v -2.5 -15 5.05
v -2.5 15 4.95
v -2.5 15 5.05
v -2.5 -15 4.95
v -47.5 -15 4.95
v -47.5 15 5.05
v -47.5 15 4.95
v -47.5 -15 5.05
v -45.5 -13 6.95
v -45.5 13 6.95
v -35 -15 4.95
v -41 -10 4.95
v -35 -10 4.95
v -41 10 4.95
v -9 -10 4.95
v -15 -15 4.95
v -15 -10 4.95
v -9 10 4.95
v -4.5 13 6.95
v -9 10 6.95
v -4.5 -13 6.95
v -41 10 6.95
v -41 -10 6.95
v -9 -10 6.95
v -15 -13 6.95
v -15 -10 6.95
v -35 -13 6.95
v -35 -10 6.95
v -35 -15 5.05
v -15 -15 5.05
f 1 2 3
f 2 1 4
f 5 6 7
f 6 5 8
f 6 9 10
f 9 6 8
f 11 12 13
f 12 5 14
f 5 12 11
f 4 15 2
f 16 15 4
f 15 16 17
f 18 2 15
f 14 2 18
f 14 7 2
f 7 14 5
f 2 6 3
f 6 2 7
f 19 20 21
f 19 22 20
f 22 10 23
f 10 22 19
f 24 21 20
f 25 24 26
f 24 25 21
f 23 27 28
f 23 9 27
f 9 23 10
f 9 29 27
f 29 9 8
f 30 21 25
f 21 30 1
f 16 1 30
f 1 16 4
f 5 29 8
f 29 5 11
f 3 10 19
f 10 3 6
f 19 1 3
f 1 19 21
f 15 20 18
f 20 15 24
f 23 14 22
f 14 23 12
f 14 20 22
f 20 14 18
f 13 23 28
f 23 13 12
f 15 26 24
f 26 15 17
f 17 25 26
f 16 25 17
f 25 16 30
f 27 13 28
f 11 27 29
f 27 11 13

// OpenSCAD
$fn=200;

R=10;   //Kantenradius
W=3;    //Wand
HF=35; //Tiefe Oben
HR=55; //Tiefe Unten
X=95; //Breite Gehäuse
Y=90; //Höhe Gehäuse

text1="Louder";
text2="ESP32";
text3="    Pro";


//Menü

part = 4; // [1:Housing, 2:Housing with Terminal 3:Front, 4:Clamp, 5:all]




//###########################################
if (part == 1){
    housing();
    };

if (part == 2){
    difference(){
    housing();
    terminal();
    
    }
    };
    
    
    if (part == 3) {
    rotate([180,0,0]) front();
    
    };
    //}
if (part == 4) {
    clamp();
    };
    
if (part == 5) {
    front();
    translate([0,0,5])clamp();
    translate([0,0,20])housing();
    
    };
   
 
//Gehäuse
module inner_housing(){

    hull(){
        translate([X/2,Y/2,R])sphere(r=R-W);
        translate([X/2,-Y/2,R])sphere(r=R-W);
        translate([-X/2,Y/2,R])sphere(r=R-W);
        translate([-X/2,-Y/2,R])sphere(r=R-W);

        translate([X/2,20,HR])sphere(r=R-W);
        translate([X/2,-Y/2,HF])sphere(r=R-W);
        translate([-X/2,20,HR])sphere(r=R-W);
        translate([-X/2,-Y/2,HF])sphere(r=R-W);
    }

}

module housing_neg() {
    difference(){
        translate([-(X+R*2)/2,-(Y+R*2)/2,+R])
        cube([X+R*2,Y+R*2,max(HF,HR)+R]);
        inner_housing();
    }
}

module display_neg() {
difference(){
    cube([X+R*2+5,Y+R*2+5,12],center=true);
    hull(){
        translate([X/2,Y/2,R])sphere(r=R);
        translate([X/2,-Y/2,R])sphere(r=R);
        translate([-X/2,Y/2,R])sphere(r=R);
        translate([-X/2,-Y/2,R])sphere(r=R);
}
translate([0,0,20])cube([150,150,20],center=true);
}
}

module gehaeuserand(){
translate([0,0,0]){
difference(){
hull(){
translate([X/2,Y/2,R])cylinder(r=R,h=2);
translate([X/2,-Y/2,R])cylinder(r=R,h=2);
translate([-X/2,Y/2,R])cylinder(r=R,h=2);
translate([-X/2,-Y/2,R])cylinder(r=R,h=2);
}


hull(){
translate([X/2,Y/2,R])cylinder(r=R-W/2,h=2);
translate([X/2,-Y/2,R])cylinder(r=R-W/2,h=2);
translate([-X/2,Y/2,R])cylinder(r=R-W/2,h=2);
translate([-X/2,-Y/2,R])cylinder(r=R-W/2,h=2);
}
}
}
}
module gehaeuserand_case(){
translate([0,0,0]){
difference(){
hull(){
translate([X/2,Y/2,R])cylinder(r=R,h=2);
translate([X/2,-Y/2,R])cylinder(r=R,h=2);
translate([-X/2,Y/2,R])cylinder(r=R,h=2);
translate([-X/2,-Y/2,R])cylinder(r=R,h=2);
}


hull(){
translate([X/2,Y/2,R])cylinder(r=R-W/2+0.2,h=2);
translate([X/2,-Y/2,R])cylinder(r=R-W/2+0.2,h=2);
translate([-X/2,Y/2,R])cylinder(r=R-W/2+0.2,h=2);
translate([-X/2,-Y/2,R])cylinder(r=R-W/2+0.2,h=2);
}
}
}
}


module housing(){

difference(){
hull(){
translate([X/2,Y/2,R])sphere(r=R);
translate([X/2,-Y/2,R])sphere(r=R);
translate([-X/2,Y/2,R])sphere(r=R);
translate([-X/2,-Y/2,R])sphere(r=R);

translate([X/2,20,HR])sphere(r=R);
translate([X/2,-Y/2,HF])sphere(r=R);
translate([-X/2,20,HR])sphere(r=R);
translate([-X/2,-Y/2,HF])sphere(r=R);
}

inner_housing();

translate([X/2,Y/2,10]) cylinder(d=3.5,h=35);
translate([X/2,-Y/2,10]) cylinder(d=3.5,h=35);
translate([-X/2,Y/2,10]) cylinder(d=3.5,h=35);
translate([-X/2,-Y/2,10]) cylinder(d=3.5,h=35);

translate([X/2,Y/2,15]) cylinder(d=6,h=35);
translate([X/2,-Y/2,15]) cylinder(d=6,h=35);
translate([-X/2,Y/2,15]) cylinder(d=6,h=35);
translate([-X/2,-Y/2,15]) cylinder(d=6,h=35);

//Schnitt
translate([0,0,0])cube([X+50,150,20],center=true);

//Netzteilstecker
translate([40,-19.5,10])rotate([0,90,0])cylinder (d=8.5,h=30);

gehaeuserand_case();
}


//Führungsrohre für Schrauben
difference(){
union(){
translate([X/2,Y/2,11]) cylinder(d=R+W+2,h=HF+15);
translate([X/2,-Y/2,11]) cylinder(d=R+W+2,h=HF+15);
translate([-X/2,Y/2,11]) cylinder(d=R+W+2,h=HF+15);
translate([-X/2,-Y/2,11]) cylinder(d=R+W+2,h=HF+15);
}
translate([X/2,Y/2,10]) cylinder(d=3.5,h=HF);
translate([X/2,-Y/2,10]) cylinder(d=3.5,h=HF);
translate([-X/2,Y/2,10]) cylinder(d=3.5,h=HF);
translate([-X/2,-Y/2,10]) cylinder(d=3.5,h=HF);




housing_neg();

translate([X/2,Y/2,15]) cylinder(d=6.5,h=35);
translate([X/2,-Y/2,15]) cylinder(d=6.5,h=35);
translate([-X/2,Y/2,15]) cylinder(d=6.5,h=35);
translate([-X/2,-Y/2,15]) cylinder(d=6.5,h=35);

}
}

module terminal(){
translate([5,0,0]){
union(){
//Ausschnitt Lautsprecher-Terminal
translate([-5,5,HR]) rotate([-70,0,0]) cube([51,30, 20],center=true);

//Verschraubung Terminal

translate([25,6.5,HR])rotate([30,0,0])cylinder (d=4,h=100);
translate([-35,6.5,HR])rotate([30,0,0])cylinder (d=4,h=100);
}
}
}



module front(){


translate([8,-4,3])rotate([180,0,0])linear_extrude(4)
    text(text1, font = "Adwaita Sans:style=Black Italic", size = 7);    
    
translate([8,7,3])rotate([180,0,0])linear_extrude(4)
    text(text2, font = "Adwaita Sans:style=Black Italic", size = 7);
    
translate([8,17,3])rotate([180,0,0])linear_extrude(4)
    text(text3, font = "Adwaita Sans:style=Black Italic", size = 7);    
//Zylinder für Boardbefestigung



difference(){
union(){
translate([-39,24.5,W])cylinder(d=8,h=12);
translate([19,-24.5,W])cylinder(d=8,h=12);
translate([-39,-24.5,W])cylinder(d=8,h=12);
}

translate([-39,24.5,W])threads(diameter=3, pitch=0.5, length=13, rez=60);
translate([19,-24.5,W])threads(diameter=3, pitch=0.5, length=13, rez=60);
translate([-39,-24.5,W])threads(diameter=3, pitch=0.5, length=13, rez=60);

translate([-36.5,19.5,10])cube([3,10,6]);

}

difference(){
gehaeuserand();
//Netzteilstecker
translate([40,-19.5,10])rotate([0,90,0])cylinder (d=8.5,h=30);
//Displayfront
}
difference(){

hull(){
translate([X/2,Y/2,R])sphere(r=R);
translate([X/2,-Y/2,R])sphere(r=R);
translate([-X/2,Y/2,R])sphere(r=R);
translate([-X/2,-Y/2,R])sphere(r=R);
}

hull(){
translate([X/2,Y/2,R])sphere(r=R-W);
translate([X/2,-Y/2,R])sphere(r=R-W);
translate([-X/2,Y/2,R])sphere(r=R-W);
translate([-X/2,-Y/2,R])sphere(r=R-W);
}


translate([0,0,20])cube([150,150,20],center=true);

//Display
translate([-25,0,-2]) cube([32,16.5, 20],center=true);
translate([-25,-2,6]) cube([35.5,23, 10],center=true);

//Netzteilstecker
translate([40,-19.5,10])rotate([0,90,0])cylinder (d=8.5,h=30);

//IR-Sensor
translate([-18,25,1])cylinder(d=15,h=5);

}



//Rahmen

difference(){
union(){
translate([-50,0,W-0.1])cylinder(d=6,h=4);
translate([0,0,W-0.1])cylinder(d=6,h=4);
translate([-25,14,W-0.1])cylinder(d=6,h=4);
}
translate([-25,0,3]) cube([45.5,26, 2.3],center=true);
display_neg();
}


difference(){
union(){
translate([X/2,Y/2,W/2]) cylinder(d=10,h=8.5);
translate([X/2,-Y/2,W/2]) cylinder(d=10,h=8.5);
translate([-X/2,Y/2,W/2]) cylinder(d=10,h=8);
translate([-X/2,-Y/2,W/2]) cylinder(d=10,h=8);

}



translate([X/2,Y/2,W/2])threads(diameter=3, pitch=0.5, length=13, rez=60);
translate([X/2,-Y/2,W/2])threads(diameter=3, pitch=0.5, length=13, rez=60);
translate([-X/2,Y/2,W/2])threads(diameter=3, pitch=0.5, length=13, rez=60);
translate([-X/2,-Y/2,W/2])threads(diameter=3, pitch=0.5, length=13, rez=60);


}



}


module clamp(){
difference(){
hull(){
translate([-25,0,5]) cube([45,30, 0.1],center=true);
translate([-25,0,6.9]) cube([41,26, 0.1],center=true);
}
translate([-25,0,5]) cube([32,20, 10],center=true);
translate([-25,-5,5]) cube([20,20, 10],center=true);
}
}


module threads(diameter=4,pitch=undef,length=10,scale=1,rez=20){
	pitch = (pitch!=undef) ? pitch : get_coarse_pitch(diameter);
	twist = length/pitch*360;
	depth=pitch*.6;
	linear_extrude(height = length, center = false, convexity = 10, twist = -twist, $fn = rez)
		translate([depth/2, 0, 0]){
			circle(r = scale*diameter/2-depth/2);
		}
}
